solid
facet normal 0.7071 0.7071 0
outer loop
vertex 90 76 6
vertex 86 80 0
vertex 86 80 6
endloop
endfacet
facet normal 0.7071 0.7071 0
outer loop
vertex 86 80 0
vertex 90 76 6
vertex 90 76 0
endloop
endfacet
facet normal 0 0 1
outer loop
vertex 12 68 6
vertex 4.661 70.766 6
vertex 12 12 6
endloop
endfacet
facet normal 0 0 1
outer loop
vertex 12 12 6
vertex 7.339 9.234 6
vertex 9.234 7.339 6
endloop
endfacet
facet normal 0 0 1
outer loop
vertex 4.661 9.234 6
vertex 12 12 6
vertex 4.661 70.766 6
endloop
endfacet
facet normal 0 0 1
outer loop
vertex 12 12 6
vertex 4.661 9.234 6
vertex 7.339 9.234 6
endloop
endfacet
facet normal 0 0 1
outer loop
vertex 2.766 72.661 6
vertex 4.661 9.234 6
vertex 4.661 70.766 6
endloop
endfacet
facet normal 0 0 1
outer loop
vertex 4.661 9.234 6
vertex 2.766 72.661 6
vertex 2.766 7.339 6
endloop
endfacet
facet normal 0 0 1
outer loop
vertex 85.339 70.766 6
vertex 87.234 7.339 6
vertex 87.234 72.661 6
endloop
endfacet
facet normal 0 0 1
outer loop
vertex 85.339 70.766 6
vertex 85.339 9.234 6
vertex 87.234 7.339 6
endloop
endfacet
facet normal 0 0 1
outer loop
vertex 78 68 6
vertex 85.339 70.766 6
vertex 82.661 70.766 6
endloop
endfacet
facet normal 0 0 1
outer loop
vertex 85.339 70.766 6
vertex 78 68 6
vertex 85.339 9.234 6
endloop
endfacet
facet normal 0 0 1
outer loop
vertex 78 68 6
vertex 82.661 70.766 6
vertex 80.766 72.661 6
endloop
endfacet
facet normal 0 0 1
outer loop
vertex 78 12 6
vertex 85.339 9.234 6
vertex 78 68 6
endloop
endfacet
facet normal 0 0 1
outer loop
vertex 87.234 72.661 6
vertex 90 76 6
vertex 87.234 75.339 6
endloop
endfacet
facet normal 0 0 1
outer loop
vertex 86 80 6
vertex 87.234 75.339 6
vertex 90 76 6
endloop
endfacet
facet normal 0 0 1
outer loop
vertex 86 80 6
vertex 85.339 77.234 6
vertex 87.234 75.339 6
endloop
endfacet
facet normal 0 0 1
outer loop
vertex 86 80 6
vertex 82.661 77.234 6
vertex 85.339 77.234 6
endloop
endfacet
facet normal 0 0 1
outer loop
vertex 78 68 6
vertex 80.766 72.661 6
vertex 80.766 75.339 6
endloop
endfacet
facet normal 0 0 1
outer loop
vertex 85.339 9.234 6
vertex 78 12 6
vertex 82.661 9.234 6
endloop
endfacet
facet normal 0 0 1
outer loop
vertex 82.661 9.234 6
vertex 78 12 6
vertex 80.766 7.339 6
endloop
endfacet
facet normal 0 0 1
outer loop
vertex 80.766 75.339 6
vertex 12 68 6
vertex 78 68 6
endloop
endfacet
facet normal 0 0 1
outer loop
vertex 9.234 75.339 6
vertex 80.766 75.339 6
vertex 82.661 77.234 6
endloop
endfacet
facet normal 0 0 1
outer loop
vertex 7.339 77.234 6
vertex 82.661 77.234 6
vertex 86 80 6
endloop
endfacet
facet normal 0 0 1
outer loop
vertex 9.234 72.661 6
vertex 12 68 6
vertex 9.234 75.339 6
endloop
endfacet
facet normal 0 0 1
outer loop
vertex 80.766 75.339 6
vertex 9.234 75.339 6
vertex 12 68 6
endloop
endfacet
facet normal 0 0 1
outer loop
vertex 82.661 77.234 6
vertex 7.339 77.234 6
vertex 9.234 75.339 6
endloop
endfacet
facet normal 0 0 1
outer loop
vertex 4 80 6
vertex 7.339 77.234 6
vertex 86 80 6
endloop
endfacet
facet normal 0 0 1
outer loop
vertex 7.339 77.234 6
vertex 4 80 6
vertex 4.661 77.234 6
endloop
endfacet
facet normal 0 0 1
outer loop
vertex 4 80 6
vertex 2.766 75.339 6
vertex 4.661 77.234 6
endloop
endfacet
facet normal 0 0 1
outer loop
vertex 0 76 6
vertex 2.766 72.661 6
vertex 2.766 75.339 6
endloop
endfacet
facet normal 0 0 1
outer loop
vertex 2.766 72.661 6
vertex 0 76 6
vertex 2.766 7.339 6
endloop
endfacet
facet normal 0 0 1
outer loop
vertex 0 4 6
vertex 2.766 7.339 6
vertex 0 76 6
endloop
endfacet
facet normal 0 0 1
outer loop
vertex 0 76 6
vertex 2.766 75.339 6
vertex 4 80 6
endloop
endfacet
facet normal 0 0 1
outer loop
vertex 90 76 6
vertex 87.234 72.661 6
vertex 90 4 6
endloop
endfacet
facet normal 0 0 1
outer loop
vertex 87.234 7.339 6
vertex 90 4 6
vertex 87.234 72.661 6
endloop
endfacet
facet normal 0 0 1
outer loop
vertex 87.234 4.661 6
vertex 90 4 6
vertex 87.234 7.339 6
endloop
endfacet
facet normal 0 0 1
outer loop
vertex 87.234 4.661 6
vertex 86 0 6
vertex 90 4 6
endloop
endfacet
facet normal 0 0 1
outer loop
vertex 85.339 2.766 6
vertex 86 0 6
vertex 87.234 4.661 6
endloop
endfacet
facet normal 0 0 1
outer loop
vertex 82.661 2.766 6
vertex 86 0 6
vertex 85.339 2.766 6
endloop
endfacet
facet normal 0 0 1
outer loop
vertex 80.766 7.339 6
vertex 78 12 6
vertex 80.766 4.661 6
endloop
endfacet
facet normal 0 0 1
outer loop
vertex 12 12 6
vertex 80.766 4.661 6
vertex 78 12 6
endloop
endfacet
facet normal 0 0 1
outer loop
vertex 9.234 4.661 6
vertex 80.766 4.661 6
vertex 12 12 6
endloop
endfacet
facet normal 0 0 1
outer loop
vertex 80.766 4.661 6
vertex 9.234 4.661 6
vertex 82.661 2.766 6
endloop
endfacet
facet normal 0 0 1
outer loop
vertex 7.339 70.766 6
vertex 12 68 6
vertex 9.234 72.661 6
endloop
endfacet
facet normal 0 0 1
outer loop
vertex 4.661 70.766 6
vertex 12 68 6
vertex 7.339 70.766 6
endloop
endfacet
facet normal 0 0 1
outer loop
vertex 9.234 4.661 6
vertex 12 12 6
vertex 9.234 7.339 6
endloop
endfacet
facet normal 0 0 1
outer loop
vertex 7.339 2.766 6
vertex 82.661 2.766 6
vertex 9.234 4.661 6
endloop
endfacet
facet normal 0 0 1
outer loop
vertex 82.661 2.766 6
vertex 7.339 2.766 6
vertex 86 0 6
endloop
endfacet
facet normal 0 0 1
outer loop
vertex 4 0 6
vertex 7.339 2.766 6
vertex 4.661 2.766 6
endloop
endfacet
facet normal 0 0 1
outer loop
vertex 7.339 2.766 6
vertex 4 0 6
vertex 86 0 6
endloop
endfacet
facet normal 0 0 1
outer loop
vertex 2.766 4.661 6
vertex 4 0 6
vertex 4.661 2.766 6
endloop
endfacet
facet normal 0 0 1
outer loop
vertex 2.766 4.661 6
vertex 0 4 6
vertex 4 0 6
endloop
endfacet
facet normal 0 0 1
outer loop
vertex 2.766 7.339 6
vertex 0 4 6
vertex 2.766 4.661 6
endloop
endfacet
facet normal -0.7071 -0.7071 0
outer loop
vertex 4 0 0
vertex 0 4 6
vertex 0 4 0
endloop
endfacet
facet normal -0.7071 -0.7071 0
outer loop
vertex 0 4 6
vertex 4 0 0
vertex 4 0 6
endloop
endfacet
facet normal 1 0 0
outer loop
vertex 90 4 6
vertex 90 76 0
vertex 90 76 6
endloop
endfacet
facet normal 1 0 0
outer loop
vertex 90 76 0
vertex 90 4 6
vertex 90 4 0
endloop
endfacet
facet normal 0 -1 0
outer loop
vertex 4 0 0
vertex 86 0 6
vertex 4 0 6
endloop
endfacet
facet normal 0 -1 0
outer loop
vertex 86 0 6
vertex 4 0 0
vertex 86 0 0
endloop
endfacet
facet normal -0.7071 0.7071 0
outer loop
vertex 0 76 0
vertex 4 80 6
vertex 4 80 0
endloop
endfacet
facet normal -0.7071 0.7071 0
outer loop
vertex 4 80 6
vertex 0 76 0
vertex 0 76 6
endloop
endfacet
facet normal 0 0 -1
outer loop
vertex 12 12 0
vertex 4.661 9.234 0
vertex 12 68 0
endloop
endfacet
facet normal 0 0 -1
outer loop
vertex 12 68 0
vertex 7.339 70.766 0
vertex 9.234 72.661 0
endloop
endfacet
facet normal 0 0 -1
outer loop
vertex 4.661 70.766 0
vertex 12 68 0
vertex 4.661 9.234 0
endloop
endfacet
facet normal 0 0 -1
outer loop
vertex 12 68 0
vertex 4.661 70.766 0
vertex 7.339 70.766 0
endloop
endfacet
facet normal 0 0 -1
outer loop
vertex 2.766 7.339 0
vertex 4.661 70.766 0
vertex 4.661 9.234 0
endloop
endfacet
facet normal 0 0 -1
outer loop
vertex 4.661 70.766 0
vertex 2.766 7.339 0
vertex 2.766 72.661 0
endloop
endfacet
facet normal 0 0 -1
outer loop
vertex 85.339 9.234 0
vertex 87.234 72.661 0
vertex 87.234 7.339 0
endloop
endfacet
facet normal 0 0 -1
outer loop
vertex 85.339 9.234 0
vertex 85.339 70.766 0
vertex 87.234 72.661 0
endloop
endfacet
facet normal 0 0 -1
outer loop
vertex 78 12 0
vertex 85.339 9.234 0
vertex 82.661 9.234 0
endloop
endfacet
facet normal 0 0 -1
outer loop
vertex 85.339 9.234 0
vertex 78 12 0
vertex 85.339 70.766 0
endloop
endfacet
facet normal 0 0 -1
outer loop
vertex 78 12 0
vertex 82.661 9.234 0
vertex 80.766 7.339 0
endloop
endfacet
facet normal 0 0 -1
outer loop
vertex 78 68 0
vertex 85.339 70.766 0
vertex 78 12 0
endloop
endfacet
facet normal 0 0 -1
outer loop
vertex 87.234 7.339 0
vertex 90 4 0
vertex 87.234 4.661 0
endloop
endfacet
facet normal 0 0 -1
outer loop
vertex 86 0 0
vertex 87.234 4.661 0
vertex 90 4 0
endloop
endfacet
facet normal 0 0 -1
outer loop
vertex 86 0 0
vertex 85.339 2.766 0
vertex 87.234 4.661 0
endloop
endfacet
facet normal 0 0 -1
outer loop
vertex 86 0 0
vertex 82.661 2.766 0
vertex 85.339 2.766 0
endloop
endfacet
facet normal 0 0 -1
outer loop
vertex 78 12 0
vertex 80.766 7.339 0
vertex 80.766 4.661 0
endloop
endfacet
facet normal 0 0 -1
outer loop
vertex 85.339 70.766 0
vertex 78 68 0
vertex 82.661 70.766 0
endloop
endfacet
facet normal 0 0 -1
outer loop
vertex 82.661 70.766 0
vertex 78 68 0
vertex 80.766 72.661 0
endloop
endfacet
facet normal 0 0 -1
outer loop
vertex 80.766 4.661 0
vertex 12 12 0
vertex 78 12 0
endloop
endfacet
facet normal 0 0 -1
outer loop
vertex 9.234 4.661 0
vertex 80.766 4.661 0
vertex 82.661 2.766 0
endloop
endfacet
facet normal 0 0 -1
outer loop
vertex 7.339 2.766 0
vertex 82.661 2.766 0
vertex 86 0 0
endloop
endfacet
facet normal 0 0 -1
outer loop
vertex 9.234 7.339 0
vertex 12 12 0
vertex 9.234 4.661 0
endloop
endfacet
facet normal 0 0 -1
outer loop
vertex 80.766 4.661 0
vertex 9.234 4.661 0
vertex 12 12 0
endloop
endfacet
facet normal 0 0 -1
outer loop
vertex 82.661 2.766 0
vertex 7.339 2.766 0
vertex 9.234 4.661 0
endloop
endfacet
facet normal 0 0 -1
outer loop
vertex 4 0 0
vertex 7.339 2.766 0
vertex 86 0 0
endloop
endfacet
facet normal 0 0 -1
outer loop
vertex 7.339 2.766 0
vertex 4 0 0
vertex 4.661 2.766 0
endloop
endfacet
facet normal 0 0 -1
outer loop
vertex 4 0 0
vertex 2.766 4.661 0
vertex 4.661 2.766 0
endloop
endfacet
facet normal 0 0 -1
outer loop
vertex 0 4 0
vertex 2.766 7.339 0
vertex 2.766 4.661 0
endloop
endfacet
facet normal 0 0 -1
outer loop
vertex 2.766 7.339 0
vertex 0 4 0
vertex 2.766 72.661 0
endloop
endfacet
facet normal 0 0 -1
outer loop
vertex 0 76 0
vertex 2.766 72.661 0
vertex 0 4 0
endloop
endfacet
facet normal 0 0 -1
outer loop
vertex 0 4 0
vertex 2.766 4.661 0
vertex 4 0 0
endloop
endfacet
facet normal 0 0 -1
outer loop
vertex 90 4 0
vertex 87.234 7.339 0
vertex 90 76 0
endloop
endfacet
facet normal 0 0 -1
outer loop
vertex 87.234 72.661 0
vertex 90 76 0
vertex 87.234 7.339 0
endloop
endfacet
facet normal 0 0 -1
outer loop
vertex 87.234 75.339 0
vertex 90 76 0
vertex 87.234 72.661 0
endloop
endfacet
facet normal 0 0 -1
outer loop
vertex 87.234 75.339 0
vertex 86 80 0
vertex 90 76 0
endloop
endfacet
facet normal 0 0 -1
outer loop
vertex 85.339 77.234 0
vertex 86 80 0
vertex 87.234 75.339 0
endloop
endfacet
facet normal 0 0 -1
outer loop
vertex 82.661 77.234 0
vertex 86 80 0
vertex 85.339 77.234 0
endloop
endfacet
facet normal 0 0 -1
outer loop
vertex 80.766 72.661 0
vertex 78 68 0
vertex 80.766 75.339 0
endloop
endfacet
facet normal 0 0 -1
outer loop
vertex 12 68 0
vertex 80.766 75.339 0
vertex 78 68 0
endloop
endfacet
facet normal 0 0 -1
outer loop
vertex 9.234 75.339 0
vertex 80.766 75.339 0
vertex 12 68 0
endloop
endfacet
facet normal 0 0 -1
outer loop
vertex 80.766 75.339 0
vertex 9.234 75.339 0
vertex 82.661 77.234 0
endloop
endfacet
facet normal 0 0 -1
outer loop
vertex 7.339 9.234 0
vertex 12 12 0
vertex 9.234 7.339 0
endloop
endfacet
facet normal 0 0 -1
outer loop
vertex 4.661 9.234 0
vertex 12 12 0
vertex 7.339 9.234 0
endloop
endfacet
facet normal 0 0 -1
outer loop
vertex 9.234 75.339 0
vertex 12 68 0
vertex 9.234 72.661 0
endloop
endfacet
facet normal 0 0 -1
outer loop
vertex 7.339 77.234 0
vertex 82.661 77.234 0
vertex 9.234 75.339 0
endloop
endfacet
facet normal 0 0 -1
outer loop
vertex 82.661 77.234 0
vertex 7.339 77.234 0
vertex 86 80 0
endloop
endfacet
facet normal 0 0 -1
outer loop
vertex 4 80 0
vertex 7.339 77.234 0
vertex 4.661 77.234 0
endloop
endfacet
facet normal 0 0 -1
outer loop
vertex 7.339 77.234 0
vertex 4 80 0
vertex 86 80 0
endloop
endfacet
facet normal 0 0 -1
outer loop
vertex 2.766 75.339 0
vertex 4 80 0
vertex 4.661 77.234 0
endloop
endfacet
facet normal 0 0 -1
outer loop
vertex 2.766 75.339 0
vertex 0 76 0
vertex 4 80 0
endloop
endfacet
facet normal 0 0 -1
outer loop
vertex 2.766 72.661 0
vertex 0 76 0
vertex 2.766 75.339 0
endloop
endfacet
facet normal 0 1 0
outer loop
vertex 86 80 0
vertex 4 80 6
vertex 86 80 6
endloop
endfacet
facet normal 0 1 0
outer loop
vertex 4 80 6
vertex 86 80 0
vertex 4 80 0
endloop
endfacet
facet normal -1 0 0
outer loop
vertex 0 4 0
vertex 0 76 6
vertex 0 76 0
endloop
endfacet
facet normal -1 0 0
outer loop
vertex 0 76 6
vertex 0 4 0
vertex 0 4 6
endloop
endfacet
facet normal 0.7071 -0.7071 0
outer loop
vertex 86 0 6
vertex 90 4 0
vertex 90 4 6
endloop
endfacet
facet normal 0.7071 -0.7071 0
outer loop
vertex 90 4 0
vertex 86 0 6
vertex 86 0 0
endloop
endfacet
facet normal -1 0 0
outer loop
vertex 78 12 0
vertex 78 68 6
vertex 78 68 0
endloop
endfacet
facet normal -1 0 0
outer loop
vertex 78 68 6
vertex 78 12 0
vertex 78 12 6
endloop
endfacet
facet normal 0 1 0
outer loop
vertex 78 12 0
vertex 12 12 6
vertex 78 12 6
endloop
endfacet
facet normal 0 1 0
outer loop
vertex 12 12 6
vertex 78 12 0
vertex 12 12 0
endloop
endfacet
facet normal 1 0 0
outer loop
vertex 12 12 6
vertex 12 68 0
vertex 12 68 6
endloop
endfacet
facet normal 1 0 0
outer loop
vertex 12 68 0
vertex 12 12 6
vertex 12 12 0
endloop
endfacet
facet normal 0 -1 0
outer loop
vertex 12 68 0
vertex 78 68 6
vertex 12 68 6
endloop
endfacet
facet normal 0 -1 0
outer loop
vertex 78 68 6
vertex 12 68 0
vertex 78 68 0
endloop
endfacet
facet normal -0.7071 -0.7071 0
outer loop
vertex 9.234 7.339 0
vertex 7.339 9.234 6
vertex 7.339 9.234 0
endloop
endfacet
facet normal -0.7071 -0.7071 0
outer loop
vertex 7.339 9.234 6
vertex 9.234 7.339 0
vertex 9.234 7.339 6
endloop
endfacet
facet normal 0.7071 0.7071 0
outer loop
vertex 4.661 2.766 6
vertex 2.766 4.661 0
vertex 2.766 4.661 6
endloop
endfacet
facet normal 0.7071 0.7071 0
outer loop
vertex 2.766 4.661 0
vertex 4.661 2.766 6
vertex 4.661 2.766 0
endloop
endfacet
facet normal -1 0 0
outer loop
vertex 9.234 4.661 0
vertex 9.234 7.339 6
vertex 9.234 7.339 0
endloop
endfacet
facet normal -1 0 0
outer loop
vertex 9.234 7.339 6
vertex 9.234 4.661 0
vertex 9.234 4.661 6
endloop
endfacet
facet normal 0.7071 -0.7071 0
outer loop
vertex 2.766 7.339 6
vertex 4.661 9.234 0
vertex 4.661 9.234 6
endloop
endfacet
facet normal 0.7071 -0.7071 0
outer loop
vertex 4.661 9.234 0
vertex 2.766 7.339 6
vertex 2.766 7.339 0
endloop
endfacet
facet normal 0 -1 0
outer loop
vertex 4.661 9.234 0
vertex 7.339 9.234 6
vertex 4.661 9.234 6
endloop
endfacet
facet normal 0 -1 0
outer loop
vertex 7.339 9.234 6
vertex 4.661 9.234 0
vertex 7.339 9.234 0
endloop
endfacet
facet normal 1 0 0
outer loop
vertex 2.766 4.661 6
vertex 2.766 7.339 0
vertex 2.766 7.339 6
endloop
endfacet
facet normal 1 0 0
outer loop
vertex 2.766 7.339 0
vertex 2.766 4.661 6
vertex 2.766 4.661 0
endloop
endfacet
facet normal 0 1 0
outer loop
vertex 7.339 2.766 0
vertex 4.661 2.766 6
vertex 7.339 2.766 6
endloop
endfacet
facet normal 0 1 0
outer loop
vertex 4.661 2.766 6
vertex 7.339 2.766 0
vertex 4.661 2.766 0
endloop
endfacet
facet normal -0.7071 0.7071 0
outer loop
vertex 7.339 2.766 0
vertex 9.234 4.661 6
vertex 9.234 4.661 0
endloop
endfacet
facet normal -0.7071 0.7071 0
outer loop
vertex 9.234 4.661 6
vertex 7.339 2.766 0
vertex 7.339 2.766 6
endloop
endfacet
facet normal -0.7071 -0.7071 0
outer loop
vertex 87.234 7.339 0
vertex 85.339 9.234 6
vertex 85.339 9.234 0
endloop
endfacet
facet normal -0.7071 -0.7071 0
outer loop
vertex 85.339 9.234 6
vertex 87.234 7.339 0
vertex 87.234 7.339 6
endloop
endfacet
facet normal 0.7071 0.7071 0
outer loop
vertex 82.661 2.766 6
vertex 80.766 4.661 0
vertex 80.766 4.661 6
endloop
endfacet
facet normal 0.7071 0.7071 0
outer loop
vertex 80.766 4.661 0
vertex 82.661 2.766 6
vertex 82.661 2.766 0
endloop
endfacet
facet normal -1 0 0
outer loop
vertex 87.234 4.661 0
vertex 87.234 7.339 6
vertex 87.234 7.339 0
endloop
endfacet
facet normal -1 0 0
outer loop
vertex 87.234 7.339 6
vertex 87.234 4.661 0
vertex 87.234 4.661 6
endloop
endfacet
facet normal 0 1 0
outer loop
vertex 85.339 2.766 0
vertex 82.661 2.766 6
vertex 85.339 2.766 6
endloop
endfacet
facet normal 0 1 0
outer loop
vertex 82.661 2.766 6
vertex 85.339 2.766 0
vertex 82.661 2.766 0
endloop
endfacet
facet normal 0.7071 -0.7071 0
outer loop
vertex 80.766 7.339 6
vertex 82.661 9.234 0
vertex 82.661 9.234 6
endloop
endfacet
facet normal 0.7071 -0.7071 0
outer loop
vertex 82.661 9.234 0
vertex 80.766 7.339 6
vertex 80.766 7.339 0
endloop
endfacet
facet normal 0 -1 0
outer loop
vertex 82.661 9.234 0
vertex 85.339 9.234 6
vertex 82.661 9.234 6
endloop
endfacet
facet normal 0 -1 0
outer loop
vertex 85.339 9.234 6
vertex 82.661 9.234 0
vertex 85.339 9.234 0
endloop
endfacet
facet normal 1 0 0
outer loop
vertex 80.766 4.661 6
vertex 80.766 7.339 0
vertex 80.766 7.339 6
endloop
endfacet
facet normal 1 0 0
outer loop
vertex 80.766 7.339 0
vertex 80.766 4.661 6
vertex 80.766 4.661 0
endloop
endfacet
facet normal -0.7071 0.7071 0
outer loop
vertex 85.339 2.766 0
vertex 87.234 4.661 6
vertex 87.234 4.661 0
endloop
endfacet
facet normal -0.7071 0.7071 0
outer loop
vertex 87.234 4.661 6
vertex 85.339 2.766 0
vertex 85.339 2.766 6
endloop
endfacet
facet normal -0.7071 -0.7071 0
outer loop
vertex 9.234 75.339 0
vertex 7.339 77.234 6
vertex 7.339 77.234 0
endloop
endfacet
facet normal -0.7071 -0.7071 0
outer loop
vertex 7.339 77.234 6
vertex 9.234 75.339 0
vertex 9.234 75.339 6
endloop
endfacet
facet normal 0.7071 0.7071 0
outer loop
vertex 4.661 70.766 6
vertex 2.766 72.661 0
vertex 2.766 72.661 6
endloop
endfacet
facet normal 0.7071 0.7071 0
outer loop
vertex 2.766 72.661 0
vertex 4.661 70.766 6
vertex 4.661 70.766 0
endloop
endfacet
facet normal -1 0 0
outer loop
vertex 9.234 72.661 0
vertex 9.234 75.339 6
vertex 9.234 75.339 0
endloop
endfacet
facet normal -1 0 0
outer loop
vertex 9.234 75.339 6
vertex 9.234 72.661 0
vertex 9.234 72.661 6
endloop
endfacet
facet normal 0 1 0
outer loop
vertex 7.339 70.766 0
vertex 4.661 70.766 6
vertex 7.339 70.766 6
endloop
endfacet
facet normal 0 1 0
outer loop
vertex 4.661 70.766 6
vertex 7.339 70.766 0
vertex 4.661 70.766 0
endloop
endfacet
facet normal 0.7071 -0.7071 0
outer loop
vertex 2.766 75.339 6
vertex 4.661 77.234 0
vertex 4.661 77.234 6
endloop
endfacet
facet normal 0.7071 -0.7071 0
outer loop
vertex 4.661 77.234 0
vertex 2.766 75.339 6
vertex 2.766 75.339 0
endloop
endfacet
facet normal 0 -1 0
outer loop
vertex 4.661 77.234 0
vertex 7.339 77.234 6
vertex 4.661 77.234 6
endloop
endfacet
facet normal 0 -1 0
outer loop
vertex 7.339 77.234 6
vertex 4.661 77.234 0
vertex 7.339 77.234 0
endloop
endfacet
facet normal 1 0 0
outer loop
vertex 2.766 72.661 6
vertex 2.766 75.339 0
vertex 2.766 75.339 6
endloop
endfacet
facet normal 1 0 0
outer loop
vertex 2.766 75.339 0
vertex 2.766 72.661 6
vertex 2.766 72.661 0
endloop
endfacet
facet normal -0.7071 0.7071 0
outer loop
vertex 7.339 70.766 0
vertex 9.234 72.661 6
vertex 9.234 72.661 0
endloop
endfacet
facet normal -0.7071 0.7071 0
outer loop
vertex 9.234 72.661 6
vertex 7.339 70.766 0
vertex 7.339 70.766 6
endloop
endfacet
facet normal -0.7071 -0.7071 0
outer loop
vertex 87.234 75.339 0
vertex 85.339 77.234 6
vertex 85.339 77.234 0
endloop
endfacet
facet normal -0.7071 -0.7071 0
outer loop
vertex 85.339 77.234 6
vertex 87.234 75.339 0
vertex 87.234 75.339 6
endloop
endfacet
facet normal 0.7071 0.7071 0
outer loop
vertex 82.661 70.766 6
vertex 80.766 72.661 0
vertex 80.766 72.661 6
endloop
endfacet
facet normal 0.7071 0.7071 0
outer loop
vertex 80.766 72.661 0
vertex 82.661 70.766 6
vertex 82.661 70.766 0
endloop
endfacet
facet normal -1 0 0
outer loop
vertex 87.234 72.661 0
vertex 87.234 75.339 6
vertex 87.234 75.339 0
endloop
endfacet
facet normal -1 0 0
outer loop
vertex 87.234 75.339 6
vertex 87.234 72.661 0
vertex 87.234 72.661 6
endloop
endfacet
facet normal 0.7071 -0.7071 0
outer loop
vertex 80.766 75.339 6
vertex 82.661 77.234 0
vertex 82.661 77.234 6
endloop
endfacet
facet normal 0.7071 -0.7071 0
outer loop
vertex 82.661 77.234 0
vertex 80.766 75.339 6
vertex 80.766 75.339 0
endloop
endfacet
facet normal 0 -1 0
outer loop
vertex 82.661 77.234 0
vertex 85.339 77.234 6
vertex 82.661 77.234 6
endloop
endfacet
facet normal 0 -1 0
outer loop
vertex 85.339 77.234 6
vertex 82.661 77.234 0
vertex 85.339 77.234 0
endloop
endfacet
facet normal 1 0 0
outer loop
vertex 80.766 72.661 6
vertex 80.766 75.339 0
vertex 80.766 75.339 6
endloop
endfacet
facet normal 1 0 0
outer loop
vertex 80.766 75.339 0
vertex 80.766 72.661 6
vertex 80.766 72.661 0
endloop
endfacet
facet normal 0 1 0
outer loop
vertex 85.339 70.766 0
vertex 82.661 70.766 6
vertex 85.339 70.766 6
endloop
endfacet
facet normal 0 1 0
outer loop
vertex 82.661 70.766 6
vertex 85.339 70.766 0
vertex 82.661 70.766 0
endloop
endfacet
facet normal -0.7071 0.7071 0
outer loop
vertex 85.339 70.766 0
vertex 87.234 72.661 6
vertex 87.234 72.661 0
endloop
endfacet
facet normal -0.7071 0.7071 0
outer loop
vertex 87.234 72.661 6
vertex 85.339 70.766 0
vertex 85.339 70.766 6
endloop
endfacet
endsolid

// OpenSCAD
$fn = 32;

// ----------------------------------------------------------------------
// Frame plate: 90 x 80 frame, 12 mm rails
// ----------------------------------------------------------------------

// --- parameters (mm) ---
plate_l = 90;             // plate length, X
plate_w = 80;             // plate width, Y
plate_t = 6;              // plate thickness, Z (extrusion height)
corner_c = 4;             // corner chamfer
frame_bar = 12;           // frame rail width
bolt_r = 3.5;             // corner bolt window radius
bolt_inset = 6;           // bolt centre inset from the edges
fit_tol = 0.1;            // declared fit tolerance (prompt contract)
free_tol = 0.3;           // declared free tolerance (prompt contract)

win_l = plate_l - 2 * frame_bar;  // window length
win_w = plate_w - 2 * frame_bar;  // window width
bolt_d = 2 * bolt_r;  // corner hole diameter

profile = [[4, 0], [86, 0], [90, 4], [90, 76], [86, 80], [4, 80], [0, 76], [0, 4]];  // primary outline, 8 points, counter clockwise
void_1 = [[12, 12], [78, 12], [78, 68], [12, 68]];  // the window, 4 points
void_2 = [[9.234, 7.339], [7.339, 9.234], [4.661, 9.234], [2.766, 7.339], [2.766, 4.661], [4.661, 2.766], [7.339, 2.766], [9.234, 4.661]];  // corner bolt window, 8 points
void_3 = [[87.234, 7.339], [85.339, 9.234], [82.661, 9.234], [80.766, 7.339], [80.766, 4.661], [82.661, 2.766], [85.339, 2.766], [87.234, 4.661]];  // corner bolt window, 8 points
void_4 = [[9.234, 75.339], [7.339, 77.234], [4.661, 77.234], [2.766, 75.339], [2.766, 72.661], [4.661, 70.766], [7.339, 70.766], [9.234, 72.661]];  // corner bolt window, 8 points
void_5 = [[87.234, 75.339], [85.339, 77.234], [82.661, 77.234], [80.766, 75.339], [80.766, 72.661], [82.661, 70.766], [85.339, 70.766], [87.234, 72.661]];  // corner bolt window, 8 points

// --- the one profile operation ---
difference() {
  linear_extrude(height = plate_t) polygon(points = profile);
  translate([0, 0, -1])
    linear_extrude(height = plate_t + 2) polygon(points = void_1);
  translate([0, 0, -1])
    linear_extrude(height = plate_t + 2) polygon(points = void_2);
  translate([0, 0, -1])
    linear_extrude(height = plate_t + 2) polygon(points = void_3);
  translate([0, 0, -1])
    linear_extrude(height = plate_t + 2) polygon(points = void_4);
  translate([0, 0, -1])
    linear_extrude(height = plate_t + 2) polygon(points = void_5);
}
